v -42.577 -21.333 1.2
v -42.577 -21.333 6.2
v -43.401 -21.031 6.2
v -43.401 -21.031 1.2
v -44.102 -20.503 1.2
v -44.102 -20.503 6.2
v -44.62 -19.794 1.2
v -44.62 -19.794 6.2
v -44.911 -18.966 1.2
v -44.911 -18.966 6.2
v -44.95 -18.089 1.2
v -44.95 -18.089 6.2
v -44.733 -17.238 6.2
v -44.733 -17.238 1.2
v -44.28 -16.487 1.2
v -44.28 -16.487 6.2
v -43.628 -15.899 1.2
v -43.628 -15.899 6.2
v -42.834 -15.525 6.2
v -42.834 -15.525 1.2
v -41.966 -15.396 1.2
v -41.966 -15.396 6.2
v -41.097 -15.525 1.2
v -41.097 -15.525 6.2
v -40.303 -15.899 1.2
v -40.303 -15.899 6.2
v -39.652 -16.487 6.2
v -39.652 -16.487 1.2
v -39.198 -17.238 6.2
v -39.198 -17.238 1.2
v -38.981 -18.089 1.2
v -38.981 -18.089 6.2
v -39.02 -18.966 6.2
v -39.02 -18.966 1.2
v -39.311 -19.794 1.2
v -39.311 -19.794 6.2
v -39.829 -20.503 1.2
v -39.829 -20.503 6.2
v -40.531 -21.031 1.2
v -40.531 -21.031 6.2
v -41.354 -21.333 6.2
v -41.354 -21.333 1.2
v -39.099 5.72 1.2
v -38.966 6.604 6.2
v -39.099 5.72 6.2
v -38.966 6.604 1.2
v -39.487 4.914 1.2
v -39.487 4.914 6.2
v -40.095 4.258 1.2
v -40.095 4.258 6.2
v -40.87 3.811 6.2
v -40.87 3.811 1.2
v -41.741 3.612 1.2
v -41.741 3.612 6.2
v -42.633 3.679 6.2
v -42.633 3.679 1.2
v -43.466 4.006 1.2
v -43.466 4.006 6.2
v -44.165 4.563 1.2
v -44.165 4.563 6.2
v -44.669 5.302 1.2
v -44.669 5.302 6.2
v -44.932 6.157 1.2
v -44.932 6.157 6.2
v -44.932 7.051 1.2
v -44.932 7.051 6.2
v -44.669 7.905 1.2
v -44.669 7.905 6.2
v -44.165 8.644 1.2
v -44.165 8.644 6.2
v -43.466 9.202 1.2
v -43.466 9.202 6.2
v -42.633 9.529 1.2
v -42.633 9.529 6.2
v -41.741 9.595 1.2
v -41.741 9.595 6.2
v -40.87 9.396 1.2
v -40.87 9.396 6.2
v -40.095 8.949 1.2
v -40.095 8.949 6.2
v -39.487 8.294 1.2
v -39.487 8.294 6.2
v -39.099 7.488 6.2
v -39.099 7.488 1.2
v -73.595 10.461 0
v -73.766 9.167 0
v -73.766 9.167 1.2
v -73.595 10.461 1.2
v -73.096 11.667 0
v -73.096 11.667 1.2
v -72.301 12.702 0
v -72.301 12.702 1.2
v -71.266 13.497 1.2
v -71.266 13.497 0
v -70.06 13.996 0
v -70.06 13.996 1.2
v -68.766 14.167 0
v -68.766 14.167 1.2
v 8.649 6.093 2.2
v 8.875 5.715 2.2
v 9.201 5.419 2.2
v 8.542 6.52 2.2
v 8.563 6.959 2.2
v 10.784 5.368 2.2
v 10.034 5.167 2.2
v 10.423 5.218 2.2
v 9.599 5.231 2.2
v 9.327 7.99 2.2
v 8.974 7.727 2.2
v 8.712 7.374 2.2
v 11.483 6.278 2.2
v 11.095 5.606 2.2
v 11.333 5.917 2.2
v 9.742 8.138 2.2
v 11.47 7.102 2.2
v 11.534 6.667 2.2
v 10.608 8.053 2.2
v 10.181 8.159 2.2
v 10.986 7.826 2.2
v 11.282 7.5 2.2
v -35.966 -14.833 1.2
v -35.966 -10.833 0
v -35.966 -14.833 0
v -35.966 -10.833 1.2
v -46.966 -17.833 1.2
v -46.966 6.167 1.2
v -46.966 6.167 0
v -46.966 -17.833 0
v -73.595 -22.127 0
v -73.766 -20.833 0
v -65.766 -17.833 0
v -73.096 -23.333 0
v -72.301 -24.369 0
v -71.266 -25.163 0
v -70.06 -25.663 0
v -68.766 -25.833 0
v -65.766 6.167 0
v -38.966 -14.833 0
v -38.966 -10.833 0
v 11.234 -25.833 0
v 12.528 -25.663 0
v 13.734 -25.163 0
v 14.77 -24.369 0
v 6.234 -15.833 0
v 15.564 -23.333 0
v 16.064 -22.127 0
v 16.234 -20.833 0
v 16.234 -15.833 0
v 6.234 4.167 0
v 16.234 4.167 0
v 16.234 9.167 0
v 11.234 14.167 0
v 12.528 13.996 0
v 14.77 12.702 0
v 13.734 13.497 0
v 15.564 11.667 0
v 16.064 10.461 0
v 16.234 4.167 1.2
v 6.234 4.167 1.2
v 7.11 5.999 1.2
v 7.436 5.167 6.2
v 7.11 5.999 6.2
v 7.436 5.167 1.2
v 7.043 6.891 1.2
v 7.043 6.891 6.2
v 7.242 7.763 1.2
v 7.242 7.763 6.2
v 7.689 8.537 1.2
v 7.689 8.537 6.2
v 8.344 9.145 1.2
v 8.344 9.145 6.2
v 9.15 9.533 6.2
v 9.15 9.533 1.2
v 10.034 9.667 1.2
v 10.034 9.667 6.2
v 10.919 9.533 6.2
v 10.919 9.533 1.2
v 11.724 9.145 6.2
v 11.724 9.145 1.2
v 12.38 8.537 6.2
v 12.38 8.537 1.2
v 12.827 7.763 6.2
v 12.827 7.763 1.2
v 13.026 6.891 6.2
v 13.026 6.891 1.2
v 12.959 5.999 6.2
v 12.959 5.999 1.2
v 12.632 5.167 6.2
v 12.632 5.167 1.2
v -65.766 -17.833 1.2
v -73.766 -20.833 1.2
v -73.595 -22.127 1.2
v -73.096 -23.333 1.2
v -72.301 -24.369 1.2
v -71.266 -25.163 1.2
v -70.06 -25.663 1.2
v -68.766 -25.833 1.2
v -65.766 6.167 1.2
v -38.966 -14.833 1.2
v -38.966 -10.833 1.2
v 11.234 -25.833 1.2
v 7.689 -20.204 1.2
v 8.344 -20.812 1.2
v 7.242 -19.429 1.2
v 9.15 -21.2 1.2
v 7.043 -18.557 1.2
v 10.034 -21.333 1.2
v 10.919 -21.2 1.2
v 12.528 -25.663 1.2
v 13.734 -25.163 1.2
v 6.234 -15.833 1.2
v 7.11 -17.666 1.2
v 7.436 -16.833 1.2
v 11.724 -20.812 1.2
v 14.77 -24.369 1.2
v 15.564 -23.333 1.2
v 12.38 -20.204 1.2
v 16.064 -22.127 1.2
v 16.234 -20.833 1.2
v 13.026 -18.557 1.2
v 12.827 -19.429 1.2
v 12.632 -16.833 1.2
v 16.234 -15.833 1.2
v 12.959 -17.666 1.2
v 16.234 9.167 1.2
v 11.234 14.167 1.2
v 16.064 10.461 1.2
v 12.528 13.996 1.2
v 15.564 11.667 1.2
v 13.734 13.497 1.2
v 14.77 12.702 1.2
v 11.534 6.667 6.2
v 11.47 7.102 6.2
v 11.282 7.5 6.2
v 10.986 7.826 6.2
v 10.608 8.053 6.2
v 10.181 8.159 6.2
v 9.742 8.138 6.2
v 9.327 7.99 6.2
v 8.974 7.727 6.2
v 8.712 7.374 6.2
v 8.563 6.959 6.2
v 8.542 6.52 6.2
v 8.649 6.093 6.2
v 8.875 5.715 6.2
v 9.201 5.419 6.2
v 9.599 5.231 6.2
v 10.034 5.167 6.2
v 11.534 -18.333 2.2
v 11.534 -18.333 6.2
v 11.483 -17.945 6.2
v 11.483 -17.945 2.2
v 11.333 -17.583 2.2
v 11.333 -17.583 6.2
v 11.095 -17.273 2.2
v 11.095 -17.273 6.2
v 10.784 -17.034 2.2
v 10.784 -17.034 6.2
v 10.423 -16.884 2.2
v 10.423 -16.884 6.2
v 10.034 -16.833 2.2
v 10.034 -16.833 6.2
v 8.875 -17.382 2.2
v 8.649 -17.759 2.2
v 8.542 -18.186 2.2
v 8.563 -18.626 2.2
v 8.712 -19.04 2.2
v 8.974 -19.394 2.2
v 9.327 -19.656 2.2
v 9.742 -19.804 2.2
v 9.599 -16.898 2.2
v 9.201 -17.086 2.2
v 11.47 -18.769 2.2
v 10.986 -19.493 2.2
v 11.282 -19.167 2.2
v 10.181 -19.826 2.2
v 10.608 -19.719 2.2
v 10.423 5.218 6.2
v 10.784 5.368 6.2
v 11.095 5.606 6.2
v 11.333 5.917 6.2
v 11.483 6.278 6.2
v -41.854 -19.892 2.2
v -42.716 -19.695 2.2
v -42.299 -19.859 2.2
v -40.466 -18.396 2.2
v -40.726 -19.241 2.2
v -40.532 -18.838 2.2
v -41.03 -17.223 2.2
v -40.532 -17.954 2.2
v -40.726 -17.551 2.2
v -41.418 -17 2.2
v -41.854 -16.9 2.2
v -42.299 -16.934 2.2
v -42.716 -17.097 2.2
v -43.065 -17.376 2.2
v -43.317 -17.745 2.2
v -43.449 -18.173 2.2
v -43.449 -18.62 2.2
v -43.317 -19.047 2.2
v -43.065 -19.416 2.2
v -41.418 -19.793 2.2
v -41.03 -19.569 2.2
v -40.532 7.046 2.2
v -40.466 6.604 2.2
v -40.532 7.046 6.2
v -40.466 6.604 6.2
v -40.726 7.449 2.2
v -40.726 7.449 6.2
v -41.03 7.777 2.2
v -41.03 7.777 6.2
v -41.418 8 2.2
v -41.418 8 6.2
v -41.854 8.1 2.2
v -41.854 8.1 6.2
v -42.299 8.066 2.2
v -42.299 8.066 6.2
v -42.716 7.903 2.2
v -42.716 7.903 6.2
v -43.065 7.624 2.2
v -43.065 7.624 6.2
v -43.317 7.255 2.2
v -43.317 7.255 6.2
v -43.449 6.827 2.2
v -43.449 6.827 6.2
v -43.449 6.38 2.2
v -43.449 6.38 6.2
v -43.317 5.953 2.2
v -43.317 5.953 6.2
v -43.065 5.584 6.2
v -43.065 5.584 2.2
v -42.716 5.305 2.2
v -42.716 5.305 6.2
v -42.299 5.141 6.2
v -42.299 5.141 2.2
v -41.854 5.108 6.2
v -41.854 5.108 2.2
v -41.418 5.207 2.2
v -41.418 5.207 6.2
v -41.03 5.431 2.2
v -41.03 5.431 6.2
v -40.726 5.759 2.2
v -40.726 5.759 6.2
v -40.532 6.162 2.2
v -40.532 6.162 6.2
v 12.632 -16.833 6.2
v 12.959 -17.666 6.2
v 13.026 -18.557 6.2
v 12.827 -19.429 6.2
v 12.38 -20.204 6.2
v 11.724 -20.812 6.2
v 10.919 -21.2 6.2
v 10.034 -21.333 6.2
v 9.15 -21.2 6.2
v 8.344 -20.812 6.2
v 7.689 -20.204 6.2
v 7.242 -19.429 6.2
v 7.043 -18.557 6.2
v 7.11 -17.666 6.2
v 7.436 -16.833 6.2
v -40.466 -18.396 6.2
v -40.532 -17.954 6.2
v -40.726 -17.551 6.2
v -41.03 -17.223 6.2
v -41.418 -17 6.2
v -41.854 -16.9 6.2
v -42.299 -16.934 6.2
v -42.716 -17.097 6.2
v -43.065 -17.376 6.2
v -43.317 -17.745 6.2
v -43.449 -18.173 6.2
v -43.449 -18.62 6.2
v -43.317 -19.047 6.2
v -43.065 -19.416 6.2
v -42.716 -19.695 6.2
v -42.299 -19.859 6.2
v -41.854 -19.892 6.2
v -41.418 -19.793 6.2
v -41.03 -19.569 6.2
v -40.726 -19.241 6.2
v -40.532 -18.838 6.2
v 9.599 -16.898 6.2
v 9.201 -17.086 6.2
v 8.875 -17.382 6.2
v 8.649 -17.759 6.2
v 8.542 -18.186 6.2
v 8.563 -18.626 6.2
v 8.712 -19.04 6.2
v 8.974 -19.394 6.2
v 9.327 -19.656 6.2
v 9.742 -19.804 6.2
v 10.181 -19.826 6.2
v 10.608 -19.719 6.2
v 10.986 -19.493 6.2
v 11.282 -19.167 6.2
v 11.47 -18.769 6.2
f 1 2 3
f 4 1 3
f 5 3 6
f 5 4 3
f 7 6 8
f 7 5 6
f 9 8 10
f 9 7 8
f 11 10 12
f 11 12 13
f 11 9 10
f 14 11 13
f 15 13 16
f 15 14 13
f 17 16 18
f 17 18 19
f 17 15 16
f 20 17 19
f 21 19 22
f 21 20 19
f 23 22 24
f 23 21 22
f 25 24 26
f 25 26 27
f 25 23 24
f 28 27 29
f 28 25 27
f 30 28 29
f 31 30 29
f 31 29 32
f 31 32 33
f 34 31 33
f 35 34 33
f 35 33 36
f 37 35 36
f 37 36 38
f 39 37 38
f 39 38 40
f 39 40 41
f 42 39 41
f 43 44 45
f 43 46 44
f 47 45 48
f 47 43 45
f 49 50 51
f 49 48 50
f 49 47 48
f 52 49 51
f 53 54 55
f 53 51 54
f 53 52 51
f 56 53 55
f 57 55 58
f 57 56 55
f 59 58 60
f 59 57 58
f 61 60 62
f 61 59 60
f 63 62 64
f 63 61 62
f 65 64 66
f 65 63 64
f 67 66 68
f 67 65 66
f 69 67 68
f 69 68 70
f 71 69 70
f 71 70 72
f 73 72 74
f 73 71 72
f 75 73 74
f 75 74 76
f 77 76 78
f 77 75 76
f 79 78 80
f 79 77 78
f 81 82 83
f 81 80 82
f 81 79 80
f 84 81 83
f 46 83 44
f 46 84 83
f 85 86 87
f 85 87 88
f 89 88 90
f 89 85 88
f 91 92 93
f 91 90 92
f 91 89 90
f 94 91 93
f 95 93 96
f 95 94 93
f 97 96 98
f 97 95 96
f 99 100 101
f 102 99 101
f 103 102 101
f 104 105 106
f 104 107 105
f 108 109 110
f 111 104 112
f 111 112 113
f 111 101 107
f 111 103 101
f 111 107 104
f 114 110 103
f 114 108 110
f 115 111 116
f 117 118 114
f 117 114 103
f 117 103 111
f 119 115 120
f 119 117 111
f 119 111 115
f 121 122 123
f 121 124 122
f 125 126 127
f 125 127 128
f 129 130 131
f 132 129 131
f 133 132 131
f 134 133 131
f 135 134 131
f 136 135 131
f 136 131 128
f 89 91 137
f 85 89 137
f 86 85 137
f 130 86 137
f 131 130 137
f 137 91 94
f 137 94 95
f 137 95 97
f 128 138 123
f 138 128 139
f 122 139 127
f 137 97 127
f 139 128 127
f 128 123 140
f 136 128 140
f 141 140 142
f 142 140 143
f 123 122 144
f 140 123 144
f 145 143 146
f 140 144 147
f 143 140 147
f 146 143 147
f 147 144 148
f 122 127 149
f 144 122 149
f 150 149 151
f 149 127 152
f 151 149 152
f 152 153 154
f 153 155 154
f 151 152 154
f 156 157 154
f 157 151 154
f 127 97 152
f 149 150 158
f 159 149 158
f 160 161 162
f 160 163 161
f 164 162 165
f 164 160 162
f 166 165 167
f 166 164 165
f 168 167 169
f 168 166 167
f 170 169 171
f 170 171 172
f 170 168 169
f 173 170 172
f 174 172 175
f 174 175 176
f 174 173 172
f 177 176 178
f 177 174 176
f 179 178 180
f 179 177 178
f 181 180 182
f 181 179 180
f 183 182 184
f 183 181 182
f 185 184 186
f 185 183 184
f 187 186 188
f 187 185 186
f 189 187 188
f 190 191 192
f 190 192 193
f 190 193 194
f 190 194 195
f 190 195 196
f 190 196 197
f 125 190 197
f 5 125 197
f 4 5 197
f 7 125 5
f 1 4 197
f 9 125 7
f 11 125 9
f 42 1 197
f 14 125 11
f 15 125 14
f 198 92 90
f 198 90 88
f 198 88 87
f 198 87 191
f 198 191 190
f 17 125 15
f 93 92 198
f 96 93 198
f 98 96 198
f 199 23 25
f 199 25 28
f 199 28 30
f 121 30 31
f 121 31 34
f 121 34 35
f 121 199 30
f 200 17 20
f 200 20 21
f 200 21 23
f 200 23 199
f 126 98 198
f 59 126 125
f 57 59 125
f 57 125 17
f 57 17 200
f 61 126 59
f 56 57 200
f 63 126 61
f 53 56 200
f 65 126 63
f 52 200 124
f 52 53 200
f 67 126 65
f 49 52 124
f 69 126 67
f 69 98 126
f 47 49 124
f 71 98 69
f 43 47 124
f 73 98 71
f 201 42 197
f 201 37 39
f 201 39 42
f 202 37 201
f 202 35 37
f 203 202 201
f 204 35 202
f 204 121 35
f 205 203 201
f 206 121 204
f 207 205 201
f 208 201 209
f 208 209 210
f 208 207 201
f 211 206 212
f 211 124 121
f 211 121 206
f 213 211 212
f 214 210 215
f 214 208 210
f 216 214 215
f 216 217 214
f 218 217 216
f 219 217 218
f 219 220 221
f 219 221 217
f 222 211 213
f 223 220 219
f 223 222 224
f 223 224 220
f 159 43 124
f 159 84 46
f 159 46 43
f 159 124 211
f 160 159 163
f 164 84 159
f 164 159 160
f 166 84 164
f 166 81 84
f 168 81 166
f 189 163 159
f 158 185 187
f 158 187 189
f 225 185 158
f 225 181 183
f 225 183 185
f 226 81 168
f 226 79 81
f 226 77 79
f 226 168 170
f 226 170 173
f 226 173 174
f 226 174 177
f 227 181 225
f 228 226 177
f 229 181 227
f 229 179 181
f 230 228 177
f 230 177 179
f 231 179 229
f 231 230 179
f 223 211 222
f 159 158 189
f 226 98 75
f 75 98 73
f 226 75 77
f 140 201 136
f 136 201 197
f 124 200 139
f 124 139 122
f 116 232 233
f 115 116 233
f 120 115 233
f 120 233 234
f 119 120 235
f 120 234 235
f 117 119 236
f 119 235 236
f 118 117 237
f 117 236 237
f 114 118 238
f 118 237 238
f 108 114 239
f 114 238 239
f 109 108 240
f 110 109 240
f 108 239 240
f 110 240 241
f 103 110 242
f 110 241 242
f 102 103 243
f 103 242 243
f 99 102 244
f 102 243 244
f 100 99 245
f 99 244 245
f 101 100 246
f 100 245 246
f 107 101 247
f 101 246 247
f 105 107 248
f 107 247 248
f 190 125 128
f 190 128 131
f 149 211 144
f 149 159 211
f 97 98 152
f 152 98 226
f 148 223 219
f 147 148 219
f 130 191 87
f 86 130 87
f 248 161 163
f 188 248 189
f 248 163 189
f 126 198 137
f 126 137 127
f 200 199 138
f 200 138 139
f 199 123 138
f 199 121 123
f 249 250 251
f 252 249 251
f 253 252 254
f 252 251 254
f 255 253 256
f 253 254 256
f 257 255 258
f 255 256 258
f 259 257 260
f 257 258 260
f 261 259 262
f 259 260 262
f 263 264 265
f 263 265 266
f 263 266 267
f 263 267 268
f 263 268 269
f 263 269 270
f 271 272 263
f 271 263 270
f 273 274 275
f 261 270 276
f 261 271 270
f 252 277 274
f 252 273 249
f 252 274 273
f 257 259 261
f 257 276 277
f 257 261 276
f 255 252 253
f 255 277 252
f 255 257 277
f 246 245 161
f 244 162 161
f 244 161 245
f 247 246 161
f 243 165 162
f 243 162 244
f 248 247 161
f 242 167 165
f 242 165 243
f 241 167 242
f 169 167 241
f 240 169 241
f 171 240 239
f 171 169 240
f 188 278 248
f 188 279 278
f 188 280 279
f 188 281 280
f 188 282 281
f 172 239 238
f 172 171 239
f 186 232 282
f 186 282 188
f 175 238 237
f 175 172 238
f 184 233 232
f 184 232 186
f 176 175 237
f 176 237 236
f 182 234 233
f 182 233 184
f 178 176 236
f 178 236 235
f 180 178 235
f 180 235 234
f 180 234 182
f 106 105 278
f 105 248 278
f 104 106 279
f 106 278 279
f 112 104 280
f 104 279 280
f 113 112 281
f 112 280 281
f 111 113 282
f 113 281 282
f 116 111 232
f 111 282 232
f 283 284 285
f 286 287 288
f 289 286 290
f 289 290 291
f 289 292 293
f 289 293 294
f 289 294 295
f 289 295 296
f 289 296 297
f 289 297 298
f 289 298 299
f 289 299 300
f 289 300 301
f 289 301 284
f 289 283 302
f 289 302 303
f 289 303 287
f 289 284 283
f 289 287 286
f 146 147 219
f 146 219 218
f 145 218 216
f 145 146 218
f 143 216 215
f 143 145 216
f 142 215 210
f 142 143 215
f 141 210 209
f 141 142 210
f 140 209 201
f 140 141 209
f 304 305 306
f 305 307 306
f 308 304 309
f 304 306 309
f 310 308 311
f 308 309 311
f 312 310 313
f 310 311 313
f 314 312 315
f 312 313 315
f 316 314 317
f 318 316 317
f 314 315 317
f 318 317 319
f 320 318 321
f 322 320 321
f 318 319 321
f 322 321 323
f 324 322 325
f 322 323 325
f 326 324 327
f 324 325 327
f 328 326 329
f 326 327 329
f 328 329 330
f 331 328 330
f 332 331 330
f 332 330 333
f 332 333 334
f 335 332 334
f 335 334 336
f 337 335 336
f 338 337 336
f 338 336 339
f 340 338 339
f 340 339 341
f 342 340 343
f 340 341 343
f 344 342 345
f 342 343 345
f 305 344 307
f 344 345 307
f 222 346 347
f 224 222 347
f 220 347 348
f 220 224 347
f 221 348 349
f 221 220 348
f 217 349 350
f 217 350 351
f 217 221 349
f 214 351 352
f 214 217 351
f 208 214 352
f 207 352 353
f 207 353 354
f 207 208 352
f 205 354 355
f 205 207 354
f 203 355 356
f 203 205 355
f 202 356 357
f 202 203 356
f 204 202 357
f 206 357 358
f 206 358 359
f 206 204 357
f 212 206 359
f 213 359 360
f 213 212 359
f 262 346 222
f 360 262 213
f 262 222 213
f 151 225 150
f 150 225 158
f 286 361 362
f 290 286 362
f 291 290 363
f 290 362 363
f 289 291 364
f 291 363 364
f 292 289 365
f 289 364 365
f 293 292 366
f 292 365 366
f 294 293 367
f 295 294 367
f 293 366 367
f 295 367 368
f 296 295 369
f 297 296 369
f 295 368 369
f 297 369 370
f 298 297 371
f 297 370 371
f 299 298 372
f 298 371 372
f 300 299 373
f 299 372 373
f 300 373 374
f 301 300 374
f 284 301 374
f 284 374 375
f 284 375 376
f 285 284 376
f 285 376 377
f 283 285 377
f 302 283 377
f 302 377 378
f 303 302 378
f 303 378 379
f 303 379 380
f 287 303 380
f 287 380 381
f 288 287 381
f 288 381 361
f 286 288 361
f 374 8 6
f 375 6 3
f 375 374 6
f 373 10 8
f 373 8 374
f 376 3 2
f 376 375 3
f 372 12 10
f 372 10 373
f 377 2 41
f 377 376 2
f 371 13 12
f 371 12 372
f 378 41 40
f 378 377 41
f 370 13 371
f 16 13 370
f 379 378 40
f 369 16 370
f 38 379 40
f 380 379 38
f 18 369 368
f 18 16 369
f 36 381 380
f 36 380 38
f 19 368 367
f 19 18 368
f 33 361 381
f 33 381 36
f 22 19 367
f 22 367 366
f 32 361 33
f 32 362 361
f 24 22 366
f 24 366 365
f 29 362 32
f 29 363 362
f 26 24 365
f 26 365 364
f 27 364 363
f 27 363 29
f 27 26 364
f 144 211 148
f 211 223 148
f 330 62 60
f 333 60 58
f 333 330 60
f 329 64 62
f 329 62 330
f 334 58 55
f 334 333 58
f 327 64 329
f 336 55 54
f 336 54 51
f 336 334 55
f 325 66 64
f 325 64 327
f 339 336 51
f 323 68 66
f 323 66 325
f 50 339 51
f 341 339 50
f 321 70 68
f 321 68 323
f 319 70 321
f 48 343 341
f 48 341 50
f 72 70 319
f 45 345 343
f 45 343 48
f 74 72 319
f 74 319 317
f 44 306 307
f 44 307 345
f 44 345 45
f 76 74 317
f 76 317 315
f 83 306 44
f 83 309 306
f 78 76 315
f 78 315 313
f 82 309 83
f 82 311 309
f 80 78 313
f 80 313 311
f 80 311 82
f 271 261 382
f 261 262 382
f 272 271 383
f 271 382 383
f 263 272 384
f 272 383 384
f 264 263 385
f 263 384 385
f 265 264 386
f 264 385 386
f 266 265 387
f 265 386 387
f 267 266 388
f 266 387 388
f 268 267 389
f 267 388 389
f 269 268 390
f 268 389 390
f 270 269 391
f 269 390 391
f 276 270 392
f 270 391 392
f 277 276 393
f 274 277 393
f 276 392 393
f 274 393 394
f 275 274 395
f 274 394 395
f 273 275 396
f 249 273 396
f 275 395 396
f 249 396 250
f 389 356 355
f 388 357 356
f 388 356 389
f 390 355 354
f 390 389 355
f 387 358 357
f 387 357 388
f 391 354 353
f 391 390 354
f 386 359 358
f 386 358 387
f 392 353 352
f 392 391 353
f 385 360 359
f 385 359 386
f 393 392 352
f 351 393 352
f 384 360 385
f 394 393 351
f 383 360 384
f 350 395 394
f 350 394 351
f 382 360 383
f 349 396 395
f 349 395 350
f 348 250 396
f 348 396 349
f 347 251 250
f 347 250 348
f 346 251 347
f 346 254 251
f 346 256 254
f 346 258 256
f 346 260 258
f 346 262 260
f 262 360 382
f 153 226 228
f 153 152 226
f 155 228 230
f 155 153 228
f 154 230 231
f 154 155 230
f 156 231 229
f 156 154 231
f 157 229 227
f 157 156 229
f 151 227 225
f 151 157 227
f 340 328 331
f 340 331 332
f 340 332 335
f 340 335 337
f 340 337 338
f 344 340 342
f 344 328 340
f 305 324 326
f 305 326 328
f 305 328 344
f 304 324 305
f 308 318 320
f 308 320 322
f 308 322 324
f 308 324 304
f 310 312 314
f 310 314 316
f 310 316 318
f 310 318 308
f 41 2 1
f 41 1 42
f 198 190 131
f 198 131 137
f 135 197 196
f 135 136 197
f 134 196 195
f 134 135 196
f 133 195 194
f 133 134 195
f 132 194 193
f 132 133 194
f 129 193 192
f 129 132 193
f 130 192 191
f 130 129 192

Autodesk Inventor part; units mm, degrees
ref_plane "YZ Plane" through (0, 0, 0) normal (1, 0, 0) x (0, 1, 0)
ref_plane "XZ Plane" through (0, 0, 0) normal (0, 1, 0) x (-1, 0, 0)
ref_plane "XY Plane" through (0, 0, 0) normal (0, 0, 1) x (1, 0, 0)
sketch "Sketch1" plane through (0, 0, 0) normal (0, 0, 1) x (1, 0, 0)
  line L0 (-66.7657, 11.6667) -> (16.2343, 11.6667)
  line L1 (16.2343, 11.6667) -> (16.2343, -23.3333)
  line L2 (16.2343, -23.3333) -> (-66.7657, -23.3333)
  line L3 (-66.7657, -23.3333) -> (-66.7657, 11.6667)
  point P0 (0, 0)
  dimension "d0" = 35
  dimension "d1" = 83
extrude "Extrusion1" add sketch "Sketch1" along normal blind 1.2
sketch "Sketch2" plane through (0, 0, 1.2) normal (0, 0, 1) x (1, 0, 0)
  line L0 (16.2343, -23.3333) -> (16.2343, 11.6667) projected
  line L1 (-66.7657, 11.6667) -> (16.2343, 11.6667)
  line L2 (16.2343, 11.6667) -> (16.2343, 9.8667)
  line L3 (16.2343, 9.8667) -> (-66.7657, 9.8667)
  line L4 (-66.7657, 9.8667) -> (-66.7657, 11.6667)
  line L5 (-66.7657, 11.6667) -> (-66.7657, -23.3333) projected
  line L6 (16.2343, -23.3333) -> (-66.7657, -23.3333)
  line L7 (-66.7657, -23.3333) -> (-66.7657, -21.5333)
  line L8 (-66.7657, -21.5333) -> (16.2343, -21.5333)
  line L9 (16.2343, -21.5333) -> (16.2343, -23.3333)
  line L10 (-66.7657, 9.8667) -> (-65.5657, 9.8667)
  line L11 (-65.5657, 9.8667) -> (-65.5657, -21.5333)
  line L12 (-65.5657, -21.5333) -> (-66.7657, -21.5333)
  line L13 (-66.7657, -21.5333) -> (-66.7657, 9.8667)
  line L14 (16.2343, 9.8667) -> (15.0343, 9.8667)
  line L15 (15.0343, 9.8667) -> (15.0343, -21.5333)
  line L16 (15.0343, -21.5333) -> (16.2343, -21.5333)
  line L17 (16.2343, -21.5333) -> (16.2343, 9.8667)
  line L18 (-66.7657, 11.6667) -> (-65.5657, 11.6667)
  line L19 (-65.5657, 11.6667) -> (-65.5657, -21.5333)
  line L20 (-65.5657, -21.5333) -> (-66.7657, -21.5333)
  line L21 (-66.7657, -21.5333) -> (-66.7657, 11.6667)
  line L22 (-66.7657, 11.6667) -> (16.2343, 11.6667)
  line L23 (16.2343, 11.6667) -> (16.2343, 9.8667)
  line L24 (16.2343, 9.8667) -> (-66.7657, 9.8667)
  line L25 (-66.7657, 9.8667) -> (-66.7657, 11.6667)
  point P0 (0, 0)
  dimension "d4" = 1.8
  dimension "d5" = 1.8
  dimension "d6" = 1.2
  dimension "d7" = 1.2
extrude "Extrusion2" add sketch "Sketch2" along normal blind 30 contours L6 L5 L8 L0 | L8 L15 L3 L0 | L3 L19 L1 L0 | L5 L3 L11 L8 | L4 L1 L19 L3
sketch "Sketch3" plane through (0, 0, 31.2) normal (0, 0, 1) x (1, 0, 0)
  point P0 (0, 0)
sketch "Sketch4" plane through (16.2343, -23.3333, 0) normal (1, 0, 0) x (0, 0, -1)
  line L0 (-1.2, 33.2) -> (-1.2, 1.8) projected
  line L1 (-1.2, 7.5) -> (-6.2, 7.5)
  line L2 (-6.2, 7.5) -> (-6.2, 27.5)
  line L3 (-6.2, 27.5) -> (-1.2, 27.5)
  line L4 (-1.2, 27.5) -> (-1.2, 7.5)
  line L5 (-1.2, 1.8) -> (-31.2, 1.8) projected
  line L6 (-1.2, 33.2) -> (-31.2, 33.2) projected
  line L7 (-6.2, 7.5) -> (0, 7.5)
  line L8 (0, 7.5) -> (0, 27.5)
  line L9 (0, 27.5) -> (-6.2, 27.5)
  line L10 (-6.2, 27.5) -> (-6.2, 7.5)
  line L11 (0, 35) -> (0, 0) projected
  point P0 (0, 23.3333)
  dimension "d10" = 20
  dimension "d11" = 5
  dimension "d12" = 5.7
  dimension "d13" = 5.7
extrude "Extrusion3" cut sketch "Sketch4" against normal blind 10
fillet "Fillet1" radius 2 8 edges at (-66.7657, 11.6667, 15.6) (-65.5657, 9.8667, 16.2) (-66.7657, -23.3333, 15.6) (-65.5657, -21.5333, 16.2) (15.0343, 9.8667, 16.2) (16.2343, 11.6667, 15.6) (16.2343, -23.3333, 15.6) (15.0343, -21.5333, 16.2)
sketch "Sketch5" plane through (0, 0, 1.2) normal (0, 0, 1) x (1, 0, 0)
  circle A0 centre (10.0343, 6.6667) radius 1.5
  circle A1 centre (10.0343, -18.3333) radius 1.5
  line L0 (15.0343, 7.8667) -> (15.0343, -19.5333) projected
  line L1 (13.0343, -21.5333) -> (-63.5657, -21.5333) projected
  line L2 (-63.5657, 9.8667) -> (13.0343, 9.8667) projected
  point P0 (0, 0)
  dimension "d17" = 3
  dimension "d18" = 3
  dimension "d19" = 25
  dimension "d20" = 5
  dimension "d21" = 5
  dimension "d22" = 3.2
  dimension "d23" = 3.2
extrude "Extrusion4" add sketch "Sketch5" along normal blind 5
sketch "Sketch6" plane through (0, 0, 1.2) normal (0, 0, 1) x (1, 0, 0)
  circle A0 centre (-41.9656, -18.3962) radius 1.5
  circle A1 centre (-41.9656, 6.6038) radius 1.5
  circle A2 centre (10.0343, 6.6667) radius 1.5 projected
  circle A3 centre (10.0343, -18.3333) radius 1.5 projected
  point P0 (0, 0)
  dimension "d26" = 3
  dimension "d27" = 3
  dimension "d28" = 25
  dimension "d29" = 52
  dimension "d30" = 52
extrude "Extrusion5" add sketch "Sketch6" along normal blind 5 contours A0 | A1
sketch "Sketch7" plane through (-41.9656, 6.6038, 6.2) normal (0, 0, 1) x (1, 0, 0)
  point P0 (41.9656, -6.6038)
sketch "Sketch8" plane through (0, 0, 1.2) normal (0, 0, 1) x (1, 0, 0)
  circle A0 centre (-41.9656, -18.3962) radius 1.5 projected
  circle A1 centre (-41.9656, -18.3962) radius 3
  circle A2 centre (-41.9656, 6.6038) radius 1.5 projected
  circle A3 centre (-41.9656, 6.6038) radius 3
  circle A4 centre (10.0343, -18.3333) radius 1.5 projected
  circle A5 centre (10.0343, -18.3333) radius 3
  circle A6 centre (10.0343, 6.6667) radius 1.5 projected
  circle A7 centre (10.0343, 6.6667) radius 3
  point P0 (0, 0)
  dimension "d33" = 6
  dimension "d34" = 6
  dimension "d35" = 6
  dimension "d36" = 6
extrude "Extrusion6" add sketch "Sketch8" along normal blind 5
sketch "Sketch9" plane through (0, 0, 1.2) normal (0, 0, 1) x (1, 0, 0)
  arc A0 (8.376, -15.8333) -> (11.6926, -15.8333) centre (10.0343, -18.3333) ccw projected
  circle A1 centre (10.0343, -18.3333) radius 3
  arc A2 (11.6926, 4.1667) -> (8.376, 4.1667) centre (10.0343, 6.6667) ccw projected
  circle A3 centre (10.0343, 6.6667) radius 3
  point P0 (0, 0)
  dimension "d39" = 6
  dimension "d40" = 6
extrude "Extrusion7" add sketch "Sketch9" against normal blind 1.2
sketch "Sketch10" plane through (-41.9656, -18.3962, 6.2) normal (0, 0, 1) x (1, 0, 0)
  circle A0 centre (0, 0) radius 3 projected
  circle A1 centre (0, 0) radius 1.5
  circle A2 centre (0, 25) radius 3 projected
  circle A3 centre (0, 25) radius 1.5
  circle A4 centre (52, 0.0629) radius 3 projected
  circle A5 centre (52, 0.0629) radius 1.5
  circle A6 centre (52, 25.0629) radius 3 projected
  circle A7 centre (52, 25.0629) radius 1.5
  point P0 (41.9656, 18.3962)
  dimension "d43" = 3
  dimension "d44" = 3
  dimension "d45" = 3
  dimension "d46" = 3
extrude "Extrusion8" cut sketch "Sketch10" against normal blind 4 contours A1 | A3 | A5 | A7
thread "Thread1" size "M3x0.5" class "6H" standard "ANSI Metric M Profile" full length
thread "Thread2" size "M3x0.5" class "6H" standard "ANSI Metric M Profile" full length
thread "Thread3" size "M3x0.5" class "6H" standard "ANSI Metric M Profile" full length
thread "Thread4" size "M3x0.5" class "6H" standard "ANSI Metric M Profile" full length
sketch "Sketch11" plane through (0, 0, 31.2) normal (0, 0, 1) x (1, 0, 0)
  arc A0 (-64.7657, 11.6667) -> (-66.7657, 9.6667) centre (-64.7657, 9.6667) ccw projected
  line L0 (-66.7657, 9.6667) -> (16.2343, 9.6667)
  line L1 (16.2343, 9.6667) -> (16.2343, 14.6667)
  line L2 (16.2343, 14.6667) -> (-66.7657, 14.6667)
  line L3 (-66.7657, 14.6667) -> (-66.7657, 9.6667)
  line L4 (16.2343, -21.3333) -> (-66.7657, -21.3333)
  line L5 (-66.7657, -21.3333) -> (-66.7657, -26.3333)
  line L6 (-66.7657, -26.3333) -> (16.2343, -26.3333)
  line L7 (16.2343, -26.3333) -> (16.2343, -21.3333)
  point P0 (0, 0)
  dimension "d57" = 5
  dimension "d58" = 5
  dimension "d59" = 83
extrude "Extrusion9" add sketch "Sketch11" against normal blind 31.2
fillet "Fillet2" radius 2 4 edges at (16.2343, -26.3333, 15.6) (16.2343, 14.6667, 15.6) (-66.7657, 14.6667, 15.6) (-66.7657, -26.3333, 15.6)
sketch "Sketch12" plane through (0, 0, 31.2) normal (0, 0, 1) x (1, 0, 0)
  line L0 (14.2343, -26.3333) -> (-64.7657, -26.3333) projected
  line L1 (8.2343, -26.3333) -> (-58.7657, -26.3333)
  line L2 (-58.7657, -26.3333) -> (-58.7657, -23.1333)
  line L3 (-58.7657, -23.1333) -> (8.2343, -23.1333)
  line L4 (8.2343, -23.1333) -> (8.2343, -26.3333)
  line L5 (-64.7657, 14.6667) -> (14.2343, 14.6667) projected
  line L6 (8.2343, 14.6667) -> (-58.7657, 14.6667)
  line L7 (-58.7657, 14.6667) -> (-58.7657, 11.4667)
  line L8 (-58.7657, 11.4667) -> (8.2343, 11.4667)
  line L9 (8.2343, 11.4667) -> (8.2343, 14.6667)
  line L10 (16.2343, -24.3333) -> (16.2343, 12.6667) projected
  line L11 (-66.7657, 12.6667) -> (-66.7657, -24.3333) projected
  line L12 (13.9061, -21.3333) -> (-64.4375, -21.3333) projected
  line L13 (10.0343, 9.6667) -> (-64.4375, 9.6667) projected
  point P0 (0, 0)
  dimension "d63" = 8
  dimension "d64" = 8
  dimension "d65" = 1.8
  dimension "d66" = 1.8
extrude "Extrusion10" cut sketch "Sketch12" against normal blind 31.2
fillet "Fillet3" radius 2 4 edges at (8.2343, -26.3333, 15.6) (-58.7657, -26.3333, 15.6) (8.2343, 14.6667, 15.6) (-58.7657, 14.6667, 15.6)
sketch "Sketch13" plane through (0, 0, 31.2) normal (0, 0, 1) x (1, 0, 0)
  line L0 (14.2343, -26.3333) -> (10.2343, -26.3333) projected
  circle A0 centre (12.2343, -23.9333) radius 1.5
  circle A1 centre (-62.7657, -23.9333) radius 1.5
  line L1 (-64.7657, -26.3333) -> (-60.7657, -26.3333) projected
  circle A2 centre (12.2343, 12.2667) radius 1.5
  circle A3 centre (-62.7657, 12.2667) radius 1.5
  line L2 (-66.7657, 12.6667) -> (-66.7657, -24.3333) projected
  line L3 (-60.7657, 14.6667) -> (-64.7657, 14.6667) projected
  line L4 (16.2343, -24.3333) -> (16.2343, 12.6667) projected
  line L5 (14.2343, 14.6667) -> (10.2343, 14.6667) projected
  line L6 (8.2343, -23.1333) -> (8.2343, -24.3333) projected
  point P0 (0, 0)
  dimension "d70" = 2.4
  dimension "d71" = 3
  dimension "d72" = 3
  dimension "d73" = 2.4
  dimension "d74" = 3
  dimension "d75" = 3
  dimension "d76" = 4
  dimension "d77" = 4
  dimension "d78" = 2.4
  dimension "d79" = 4
  dimension "d80" = 2.4
  dimension "d81" = 4
hole "Hole1" at (12.2343, -23.9333, 31.2) at (12.2343, 12.2667, 31.2) at (-62.7657, -23.9333, 31.2) at (-62.7657, 12.2667, 31.2) direction (0, 0, -1) diameter 3 depth 5 tip angle 118
sketch "Sketch14" plane through (0, 0, 31.2) normal (0, 0, 1) x (1, 0, 0)
  line L0 (-68.9331, 15.611) -> (20.031, 15.611)
  line L1 (20.031, 15.611) -> (20.031, -27.6485)
  line L2 (20.031, -27.6485) -> (-68.9331, -27.6485)
  line L3 (-68.9331, -27.6485) -> (-68.9331, 15.611)
  point P0 (0, 0)
extrude "Extrusion11" cut sketch "Sketch14" against normal blind 25
sketch "Sketch15" plane through (0, 0, 6.2) normal (0, 0, 1) x (1, 0, 0)
  line L0 (-73.259, 21.6297) -> (22.194, 21.6297)
  line L1 (22.194, 21.6297) -> (22.194, 9.6667)
  line L2 (22.194, 9.6667) -> (-73.259, 9.6667)
  line L3 (-73.259, 9.6667) -> (-73.259, 21.6297)
  line L4 (-69.8735, -21.3333) -> (26.0497, -21.3333)
  line L5 (26.0497, -21.3333) -> (26.0497, -30.3757)
  line L6 (26.0497, -30.3757) -> (-69.8735, -30.3757)
  line L7 (-69.8735, -30.3757) -> (-69.8735, -21.3333)
  line L8 (10.0343, 9.6667) -> (-64.4375, 9.6667) projected
  line L9 (-41.3548, -21.3333) -> (10.0343, -21.3333) projected
  point P0 (0, 0)
extrude "Extrusion12" cut sketch "Sketch15" against normal blind 25
sketch "Sketch16" plane through (0, 0, 1.2) normal (0, 0, 1) x (1, 0, 0)
  line L0 (6.2343, 4.1667) -> (16.2343, 4.1667)
  line L1 (16.2343, 4.1667) -> (16.2343, -15.8333)
  line L2 (16.2343, -15.8333) -> (6.2343, -15.8333)
  line L3 (6.2343, -15.8333) -> (6.2343, 4.1667)
  point P0 (0, 0)
extrude "Extrusion13" cut sketch "Sketch16" against normal blind 25
sketch "Sketch17" plane through (0, 0, 1.2) normal (0, 0, 1) x (1, 0, 0)
  line L0 (6.2343, 4.1667) -> (16.2343, 4.1667)
  line L1 (16.2343, 4.1667) -> (16.2343, -15.8333)
  line L2 (16.2343, -15.8333) -> (6.2343, -15.8333)
  line L3 (6.2343, -15.8333) -> (6.2343, 4.1667)
  point P0 (0, 0)
extrude "Extrusion14" cut sketch "Sketch17" along normal blind 25
sketch "Sketch18" plane through (0, 0, 1.2) normal (0, 0, 1) x (1, 0, 0)
  line L0 (15.0343, -19.5333) -> (15.0343, -15.8333) projected
  line L1 (6.2343, 5.1667) -> (15.0343, 5.1667)
  line L2 (15.0343, 5.1667) -> (15.0343, -16.8333)
  line L3 (15.0343, -16.8333) -> (6.2343, -16.8333)
  line L4 (6.2343, -16.8333) -> (6.2343, 5.1667)
  line L5 (6.2343, 4.1667) -> (8.376, 4.1667) projected
  line L6 (15.0343, -15.8333) -> (11.6926, -15.8333) projected
  line L7 (6.2343, -15.8333) -> (6.2343, 4.1667) projected
  point P0 (0, 0)
  dimension "d97" = 1
  dimension "d98" = 1
extrude "Extrusion15" cut sketch "Sketch18" along normal blind 25
sketch "Sketch19" plane through (0, 0, 6.2) normal (0, 0, 1) x (1, 0, 0)
  line L0 (13.9061, 9.6667) -> (16.2343, 9.6667)
  line L1 (16.2343, 9.6667) -> (16.2343, -21.3333)
  line L2 (16.2343, -21.3333) -> (13.9061, -21.3333)
  line L3 (13.9061, -21.3333) -> (13.9061, 9.6667)
  line L4 (-66.7657, 9.6667) -> (-64.4375, 9.6667)
  line L5 (-64.4375, 9.6667) -> (-64.4375, -21.3333)
  line L6 (-64.4375, -21.3333) -> (-66.7657, -21.3333)
  line L7 (-66.7657, -21.3333) -> (-66.7657, 9.6667)
  point P0 (0, 0)
extrude "Extrusion16" cut sketch "Sketch19" against normal blind 5
sketch "Sketch20" plane through (0, 0, 1.2) normal (0, 0, 1) x (1, 0, 0)
  line L0 (-73.7657, 14.1667) -> (16.2343, 14.1667)
  line L1 (16.2343, 14.1667) -> (16.2343, -25.8333)
  line L2 (16.2343, -25.8333) -> (-73.7657, -25.8333)
  line L3 (-73.7657, -25.8333) -> (-73.7657, 14.1667)
  line L4 (16.2343, 9.6667) -> (16.2343, 4.1667) projected
  line L5 (-66.7657, 9.6667) -> (16.2343, 9.6667) projected
  line L6 (-41.3548, -21.3333) -> (10.0343, -21.3333) projected
  line L7 (-66.7657, -21.3333) -> (-66.7657, 9.6667) projected
  line L8 (16.2343, 4.1667) -> (6.2343, 4.1667)
  line L9 (6.2343, 4.1667) -> (6.2343, -15.8333)
  line L10 (6.2343, -15.8333) -> (16.2343, -15.8333)
  line L11 (16.2343, -15.8333) -> (16.2343, 4.1667)
  point P0 (0, 0)
  dimension "d103" = 90
  dimension "d104" = 40
  dimension "d105" = 4.5
  dimension "d106" = 4.5
  dimension "d107" = 7
extrude "Extrusion17" add sketch "Sketch20" against normal blind 1.2 contours L0 L1 L8 L9 L10 L2 L3
fillet "Fillet4" radius 5 4 edges at (-73.7657, 14.1667, 0.6) (-73.7657, -25.8333, 0.6) (16.2343, -25.8333, 0.6) (16.2343, 14.1667, 0.6)
sketch "Sketch21" plane through (0, 0, 1.2) normal (0, 0, 1) x (1, 0, 0)
  line L0 (-65.7657, 6.1667) -> (-46.9656, 6.1667)
  line L1 (-46.9656, 6.1667) -> (-46.9656, -17.8333)
  line L2 (-46.9656, -17.8333) -> (-65.7657, -17.8333)
  line L3 (-65.7657, -17.8333) -> (-65.7657, 6.1667)
  line L4 (-68.7657, 14.1667) -> (11.2343, 14.1667) projected
  line L5 (11.2343, -25.8333) -> (-68.7657, -25.8333) projected
  line L6 (-73.7657, -20.8333) -> (-73.7657, 9.1667) projected
  circle A0 centre (-41.9656, 6.6038) radius 1.5 projected
  point P0 (0, 0)
  dimension "d111" = 8
  dimension "d112" = 8
  dimension "d113" = 8
  dimension "d114" = 5
extrude "Extrusion18" cut sketch "Sketch21" against normal blind 1.2 contours L0 L1 L2 L3
sketch "Sketch22" plane through (0, 0, 1.2) normal (0, 0, 1) x (1, 0, 0)
  line L0 (-38.9656, -10.8333) -> (-35.9656, -10.8333)
  line L1 (-35.9656, -10.8333) -> (-35.9656, -14.8333)
  line L2 (-35.9656, -14.8333) -> (-38.9656, -14.8333)
  line L3 (-38.9656, -14.8333) -> (-38.9656, -10.8333)
  line L4 (-46.9656, -17.8333) -> (-65.7657, -17.8333) projected
  circle A0 centre (-41.9656, -18.3962) radius 1.5 projected
  line L5 (11.2343, -25.8333) -> (-68.7657, -25.8333) projected
  point P0 (0, 0)
  dimension "d117" = 3
  dimension "d119" = 4
  dimension "d120" = 3
  dimension "d121" = 11
extrude "Extrusion19" cut sketch "Sketch22" against normal blind 1.2 contours L0 L1 L2 L3
properties part number "Case MCU"
